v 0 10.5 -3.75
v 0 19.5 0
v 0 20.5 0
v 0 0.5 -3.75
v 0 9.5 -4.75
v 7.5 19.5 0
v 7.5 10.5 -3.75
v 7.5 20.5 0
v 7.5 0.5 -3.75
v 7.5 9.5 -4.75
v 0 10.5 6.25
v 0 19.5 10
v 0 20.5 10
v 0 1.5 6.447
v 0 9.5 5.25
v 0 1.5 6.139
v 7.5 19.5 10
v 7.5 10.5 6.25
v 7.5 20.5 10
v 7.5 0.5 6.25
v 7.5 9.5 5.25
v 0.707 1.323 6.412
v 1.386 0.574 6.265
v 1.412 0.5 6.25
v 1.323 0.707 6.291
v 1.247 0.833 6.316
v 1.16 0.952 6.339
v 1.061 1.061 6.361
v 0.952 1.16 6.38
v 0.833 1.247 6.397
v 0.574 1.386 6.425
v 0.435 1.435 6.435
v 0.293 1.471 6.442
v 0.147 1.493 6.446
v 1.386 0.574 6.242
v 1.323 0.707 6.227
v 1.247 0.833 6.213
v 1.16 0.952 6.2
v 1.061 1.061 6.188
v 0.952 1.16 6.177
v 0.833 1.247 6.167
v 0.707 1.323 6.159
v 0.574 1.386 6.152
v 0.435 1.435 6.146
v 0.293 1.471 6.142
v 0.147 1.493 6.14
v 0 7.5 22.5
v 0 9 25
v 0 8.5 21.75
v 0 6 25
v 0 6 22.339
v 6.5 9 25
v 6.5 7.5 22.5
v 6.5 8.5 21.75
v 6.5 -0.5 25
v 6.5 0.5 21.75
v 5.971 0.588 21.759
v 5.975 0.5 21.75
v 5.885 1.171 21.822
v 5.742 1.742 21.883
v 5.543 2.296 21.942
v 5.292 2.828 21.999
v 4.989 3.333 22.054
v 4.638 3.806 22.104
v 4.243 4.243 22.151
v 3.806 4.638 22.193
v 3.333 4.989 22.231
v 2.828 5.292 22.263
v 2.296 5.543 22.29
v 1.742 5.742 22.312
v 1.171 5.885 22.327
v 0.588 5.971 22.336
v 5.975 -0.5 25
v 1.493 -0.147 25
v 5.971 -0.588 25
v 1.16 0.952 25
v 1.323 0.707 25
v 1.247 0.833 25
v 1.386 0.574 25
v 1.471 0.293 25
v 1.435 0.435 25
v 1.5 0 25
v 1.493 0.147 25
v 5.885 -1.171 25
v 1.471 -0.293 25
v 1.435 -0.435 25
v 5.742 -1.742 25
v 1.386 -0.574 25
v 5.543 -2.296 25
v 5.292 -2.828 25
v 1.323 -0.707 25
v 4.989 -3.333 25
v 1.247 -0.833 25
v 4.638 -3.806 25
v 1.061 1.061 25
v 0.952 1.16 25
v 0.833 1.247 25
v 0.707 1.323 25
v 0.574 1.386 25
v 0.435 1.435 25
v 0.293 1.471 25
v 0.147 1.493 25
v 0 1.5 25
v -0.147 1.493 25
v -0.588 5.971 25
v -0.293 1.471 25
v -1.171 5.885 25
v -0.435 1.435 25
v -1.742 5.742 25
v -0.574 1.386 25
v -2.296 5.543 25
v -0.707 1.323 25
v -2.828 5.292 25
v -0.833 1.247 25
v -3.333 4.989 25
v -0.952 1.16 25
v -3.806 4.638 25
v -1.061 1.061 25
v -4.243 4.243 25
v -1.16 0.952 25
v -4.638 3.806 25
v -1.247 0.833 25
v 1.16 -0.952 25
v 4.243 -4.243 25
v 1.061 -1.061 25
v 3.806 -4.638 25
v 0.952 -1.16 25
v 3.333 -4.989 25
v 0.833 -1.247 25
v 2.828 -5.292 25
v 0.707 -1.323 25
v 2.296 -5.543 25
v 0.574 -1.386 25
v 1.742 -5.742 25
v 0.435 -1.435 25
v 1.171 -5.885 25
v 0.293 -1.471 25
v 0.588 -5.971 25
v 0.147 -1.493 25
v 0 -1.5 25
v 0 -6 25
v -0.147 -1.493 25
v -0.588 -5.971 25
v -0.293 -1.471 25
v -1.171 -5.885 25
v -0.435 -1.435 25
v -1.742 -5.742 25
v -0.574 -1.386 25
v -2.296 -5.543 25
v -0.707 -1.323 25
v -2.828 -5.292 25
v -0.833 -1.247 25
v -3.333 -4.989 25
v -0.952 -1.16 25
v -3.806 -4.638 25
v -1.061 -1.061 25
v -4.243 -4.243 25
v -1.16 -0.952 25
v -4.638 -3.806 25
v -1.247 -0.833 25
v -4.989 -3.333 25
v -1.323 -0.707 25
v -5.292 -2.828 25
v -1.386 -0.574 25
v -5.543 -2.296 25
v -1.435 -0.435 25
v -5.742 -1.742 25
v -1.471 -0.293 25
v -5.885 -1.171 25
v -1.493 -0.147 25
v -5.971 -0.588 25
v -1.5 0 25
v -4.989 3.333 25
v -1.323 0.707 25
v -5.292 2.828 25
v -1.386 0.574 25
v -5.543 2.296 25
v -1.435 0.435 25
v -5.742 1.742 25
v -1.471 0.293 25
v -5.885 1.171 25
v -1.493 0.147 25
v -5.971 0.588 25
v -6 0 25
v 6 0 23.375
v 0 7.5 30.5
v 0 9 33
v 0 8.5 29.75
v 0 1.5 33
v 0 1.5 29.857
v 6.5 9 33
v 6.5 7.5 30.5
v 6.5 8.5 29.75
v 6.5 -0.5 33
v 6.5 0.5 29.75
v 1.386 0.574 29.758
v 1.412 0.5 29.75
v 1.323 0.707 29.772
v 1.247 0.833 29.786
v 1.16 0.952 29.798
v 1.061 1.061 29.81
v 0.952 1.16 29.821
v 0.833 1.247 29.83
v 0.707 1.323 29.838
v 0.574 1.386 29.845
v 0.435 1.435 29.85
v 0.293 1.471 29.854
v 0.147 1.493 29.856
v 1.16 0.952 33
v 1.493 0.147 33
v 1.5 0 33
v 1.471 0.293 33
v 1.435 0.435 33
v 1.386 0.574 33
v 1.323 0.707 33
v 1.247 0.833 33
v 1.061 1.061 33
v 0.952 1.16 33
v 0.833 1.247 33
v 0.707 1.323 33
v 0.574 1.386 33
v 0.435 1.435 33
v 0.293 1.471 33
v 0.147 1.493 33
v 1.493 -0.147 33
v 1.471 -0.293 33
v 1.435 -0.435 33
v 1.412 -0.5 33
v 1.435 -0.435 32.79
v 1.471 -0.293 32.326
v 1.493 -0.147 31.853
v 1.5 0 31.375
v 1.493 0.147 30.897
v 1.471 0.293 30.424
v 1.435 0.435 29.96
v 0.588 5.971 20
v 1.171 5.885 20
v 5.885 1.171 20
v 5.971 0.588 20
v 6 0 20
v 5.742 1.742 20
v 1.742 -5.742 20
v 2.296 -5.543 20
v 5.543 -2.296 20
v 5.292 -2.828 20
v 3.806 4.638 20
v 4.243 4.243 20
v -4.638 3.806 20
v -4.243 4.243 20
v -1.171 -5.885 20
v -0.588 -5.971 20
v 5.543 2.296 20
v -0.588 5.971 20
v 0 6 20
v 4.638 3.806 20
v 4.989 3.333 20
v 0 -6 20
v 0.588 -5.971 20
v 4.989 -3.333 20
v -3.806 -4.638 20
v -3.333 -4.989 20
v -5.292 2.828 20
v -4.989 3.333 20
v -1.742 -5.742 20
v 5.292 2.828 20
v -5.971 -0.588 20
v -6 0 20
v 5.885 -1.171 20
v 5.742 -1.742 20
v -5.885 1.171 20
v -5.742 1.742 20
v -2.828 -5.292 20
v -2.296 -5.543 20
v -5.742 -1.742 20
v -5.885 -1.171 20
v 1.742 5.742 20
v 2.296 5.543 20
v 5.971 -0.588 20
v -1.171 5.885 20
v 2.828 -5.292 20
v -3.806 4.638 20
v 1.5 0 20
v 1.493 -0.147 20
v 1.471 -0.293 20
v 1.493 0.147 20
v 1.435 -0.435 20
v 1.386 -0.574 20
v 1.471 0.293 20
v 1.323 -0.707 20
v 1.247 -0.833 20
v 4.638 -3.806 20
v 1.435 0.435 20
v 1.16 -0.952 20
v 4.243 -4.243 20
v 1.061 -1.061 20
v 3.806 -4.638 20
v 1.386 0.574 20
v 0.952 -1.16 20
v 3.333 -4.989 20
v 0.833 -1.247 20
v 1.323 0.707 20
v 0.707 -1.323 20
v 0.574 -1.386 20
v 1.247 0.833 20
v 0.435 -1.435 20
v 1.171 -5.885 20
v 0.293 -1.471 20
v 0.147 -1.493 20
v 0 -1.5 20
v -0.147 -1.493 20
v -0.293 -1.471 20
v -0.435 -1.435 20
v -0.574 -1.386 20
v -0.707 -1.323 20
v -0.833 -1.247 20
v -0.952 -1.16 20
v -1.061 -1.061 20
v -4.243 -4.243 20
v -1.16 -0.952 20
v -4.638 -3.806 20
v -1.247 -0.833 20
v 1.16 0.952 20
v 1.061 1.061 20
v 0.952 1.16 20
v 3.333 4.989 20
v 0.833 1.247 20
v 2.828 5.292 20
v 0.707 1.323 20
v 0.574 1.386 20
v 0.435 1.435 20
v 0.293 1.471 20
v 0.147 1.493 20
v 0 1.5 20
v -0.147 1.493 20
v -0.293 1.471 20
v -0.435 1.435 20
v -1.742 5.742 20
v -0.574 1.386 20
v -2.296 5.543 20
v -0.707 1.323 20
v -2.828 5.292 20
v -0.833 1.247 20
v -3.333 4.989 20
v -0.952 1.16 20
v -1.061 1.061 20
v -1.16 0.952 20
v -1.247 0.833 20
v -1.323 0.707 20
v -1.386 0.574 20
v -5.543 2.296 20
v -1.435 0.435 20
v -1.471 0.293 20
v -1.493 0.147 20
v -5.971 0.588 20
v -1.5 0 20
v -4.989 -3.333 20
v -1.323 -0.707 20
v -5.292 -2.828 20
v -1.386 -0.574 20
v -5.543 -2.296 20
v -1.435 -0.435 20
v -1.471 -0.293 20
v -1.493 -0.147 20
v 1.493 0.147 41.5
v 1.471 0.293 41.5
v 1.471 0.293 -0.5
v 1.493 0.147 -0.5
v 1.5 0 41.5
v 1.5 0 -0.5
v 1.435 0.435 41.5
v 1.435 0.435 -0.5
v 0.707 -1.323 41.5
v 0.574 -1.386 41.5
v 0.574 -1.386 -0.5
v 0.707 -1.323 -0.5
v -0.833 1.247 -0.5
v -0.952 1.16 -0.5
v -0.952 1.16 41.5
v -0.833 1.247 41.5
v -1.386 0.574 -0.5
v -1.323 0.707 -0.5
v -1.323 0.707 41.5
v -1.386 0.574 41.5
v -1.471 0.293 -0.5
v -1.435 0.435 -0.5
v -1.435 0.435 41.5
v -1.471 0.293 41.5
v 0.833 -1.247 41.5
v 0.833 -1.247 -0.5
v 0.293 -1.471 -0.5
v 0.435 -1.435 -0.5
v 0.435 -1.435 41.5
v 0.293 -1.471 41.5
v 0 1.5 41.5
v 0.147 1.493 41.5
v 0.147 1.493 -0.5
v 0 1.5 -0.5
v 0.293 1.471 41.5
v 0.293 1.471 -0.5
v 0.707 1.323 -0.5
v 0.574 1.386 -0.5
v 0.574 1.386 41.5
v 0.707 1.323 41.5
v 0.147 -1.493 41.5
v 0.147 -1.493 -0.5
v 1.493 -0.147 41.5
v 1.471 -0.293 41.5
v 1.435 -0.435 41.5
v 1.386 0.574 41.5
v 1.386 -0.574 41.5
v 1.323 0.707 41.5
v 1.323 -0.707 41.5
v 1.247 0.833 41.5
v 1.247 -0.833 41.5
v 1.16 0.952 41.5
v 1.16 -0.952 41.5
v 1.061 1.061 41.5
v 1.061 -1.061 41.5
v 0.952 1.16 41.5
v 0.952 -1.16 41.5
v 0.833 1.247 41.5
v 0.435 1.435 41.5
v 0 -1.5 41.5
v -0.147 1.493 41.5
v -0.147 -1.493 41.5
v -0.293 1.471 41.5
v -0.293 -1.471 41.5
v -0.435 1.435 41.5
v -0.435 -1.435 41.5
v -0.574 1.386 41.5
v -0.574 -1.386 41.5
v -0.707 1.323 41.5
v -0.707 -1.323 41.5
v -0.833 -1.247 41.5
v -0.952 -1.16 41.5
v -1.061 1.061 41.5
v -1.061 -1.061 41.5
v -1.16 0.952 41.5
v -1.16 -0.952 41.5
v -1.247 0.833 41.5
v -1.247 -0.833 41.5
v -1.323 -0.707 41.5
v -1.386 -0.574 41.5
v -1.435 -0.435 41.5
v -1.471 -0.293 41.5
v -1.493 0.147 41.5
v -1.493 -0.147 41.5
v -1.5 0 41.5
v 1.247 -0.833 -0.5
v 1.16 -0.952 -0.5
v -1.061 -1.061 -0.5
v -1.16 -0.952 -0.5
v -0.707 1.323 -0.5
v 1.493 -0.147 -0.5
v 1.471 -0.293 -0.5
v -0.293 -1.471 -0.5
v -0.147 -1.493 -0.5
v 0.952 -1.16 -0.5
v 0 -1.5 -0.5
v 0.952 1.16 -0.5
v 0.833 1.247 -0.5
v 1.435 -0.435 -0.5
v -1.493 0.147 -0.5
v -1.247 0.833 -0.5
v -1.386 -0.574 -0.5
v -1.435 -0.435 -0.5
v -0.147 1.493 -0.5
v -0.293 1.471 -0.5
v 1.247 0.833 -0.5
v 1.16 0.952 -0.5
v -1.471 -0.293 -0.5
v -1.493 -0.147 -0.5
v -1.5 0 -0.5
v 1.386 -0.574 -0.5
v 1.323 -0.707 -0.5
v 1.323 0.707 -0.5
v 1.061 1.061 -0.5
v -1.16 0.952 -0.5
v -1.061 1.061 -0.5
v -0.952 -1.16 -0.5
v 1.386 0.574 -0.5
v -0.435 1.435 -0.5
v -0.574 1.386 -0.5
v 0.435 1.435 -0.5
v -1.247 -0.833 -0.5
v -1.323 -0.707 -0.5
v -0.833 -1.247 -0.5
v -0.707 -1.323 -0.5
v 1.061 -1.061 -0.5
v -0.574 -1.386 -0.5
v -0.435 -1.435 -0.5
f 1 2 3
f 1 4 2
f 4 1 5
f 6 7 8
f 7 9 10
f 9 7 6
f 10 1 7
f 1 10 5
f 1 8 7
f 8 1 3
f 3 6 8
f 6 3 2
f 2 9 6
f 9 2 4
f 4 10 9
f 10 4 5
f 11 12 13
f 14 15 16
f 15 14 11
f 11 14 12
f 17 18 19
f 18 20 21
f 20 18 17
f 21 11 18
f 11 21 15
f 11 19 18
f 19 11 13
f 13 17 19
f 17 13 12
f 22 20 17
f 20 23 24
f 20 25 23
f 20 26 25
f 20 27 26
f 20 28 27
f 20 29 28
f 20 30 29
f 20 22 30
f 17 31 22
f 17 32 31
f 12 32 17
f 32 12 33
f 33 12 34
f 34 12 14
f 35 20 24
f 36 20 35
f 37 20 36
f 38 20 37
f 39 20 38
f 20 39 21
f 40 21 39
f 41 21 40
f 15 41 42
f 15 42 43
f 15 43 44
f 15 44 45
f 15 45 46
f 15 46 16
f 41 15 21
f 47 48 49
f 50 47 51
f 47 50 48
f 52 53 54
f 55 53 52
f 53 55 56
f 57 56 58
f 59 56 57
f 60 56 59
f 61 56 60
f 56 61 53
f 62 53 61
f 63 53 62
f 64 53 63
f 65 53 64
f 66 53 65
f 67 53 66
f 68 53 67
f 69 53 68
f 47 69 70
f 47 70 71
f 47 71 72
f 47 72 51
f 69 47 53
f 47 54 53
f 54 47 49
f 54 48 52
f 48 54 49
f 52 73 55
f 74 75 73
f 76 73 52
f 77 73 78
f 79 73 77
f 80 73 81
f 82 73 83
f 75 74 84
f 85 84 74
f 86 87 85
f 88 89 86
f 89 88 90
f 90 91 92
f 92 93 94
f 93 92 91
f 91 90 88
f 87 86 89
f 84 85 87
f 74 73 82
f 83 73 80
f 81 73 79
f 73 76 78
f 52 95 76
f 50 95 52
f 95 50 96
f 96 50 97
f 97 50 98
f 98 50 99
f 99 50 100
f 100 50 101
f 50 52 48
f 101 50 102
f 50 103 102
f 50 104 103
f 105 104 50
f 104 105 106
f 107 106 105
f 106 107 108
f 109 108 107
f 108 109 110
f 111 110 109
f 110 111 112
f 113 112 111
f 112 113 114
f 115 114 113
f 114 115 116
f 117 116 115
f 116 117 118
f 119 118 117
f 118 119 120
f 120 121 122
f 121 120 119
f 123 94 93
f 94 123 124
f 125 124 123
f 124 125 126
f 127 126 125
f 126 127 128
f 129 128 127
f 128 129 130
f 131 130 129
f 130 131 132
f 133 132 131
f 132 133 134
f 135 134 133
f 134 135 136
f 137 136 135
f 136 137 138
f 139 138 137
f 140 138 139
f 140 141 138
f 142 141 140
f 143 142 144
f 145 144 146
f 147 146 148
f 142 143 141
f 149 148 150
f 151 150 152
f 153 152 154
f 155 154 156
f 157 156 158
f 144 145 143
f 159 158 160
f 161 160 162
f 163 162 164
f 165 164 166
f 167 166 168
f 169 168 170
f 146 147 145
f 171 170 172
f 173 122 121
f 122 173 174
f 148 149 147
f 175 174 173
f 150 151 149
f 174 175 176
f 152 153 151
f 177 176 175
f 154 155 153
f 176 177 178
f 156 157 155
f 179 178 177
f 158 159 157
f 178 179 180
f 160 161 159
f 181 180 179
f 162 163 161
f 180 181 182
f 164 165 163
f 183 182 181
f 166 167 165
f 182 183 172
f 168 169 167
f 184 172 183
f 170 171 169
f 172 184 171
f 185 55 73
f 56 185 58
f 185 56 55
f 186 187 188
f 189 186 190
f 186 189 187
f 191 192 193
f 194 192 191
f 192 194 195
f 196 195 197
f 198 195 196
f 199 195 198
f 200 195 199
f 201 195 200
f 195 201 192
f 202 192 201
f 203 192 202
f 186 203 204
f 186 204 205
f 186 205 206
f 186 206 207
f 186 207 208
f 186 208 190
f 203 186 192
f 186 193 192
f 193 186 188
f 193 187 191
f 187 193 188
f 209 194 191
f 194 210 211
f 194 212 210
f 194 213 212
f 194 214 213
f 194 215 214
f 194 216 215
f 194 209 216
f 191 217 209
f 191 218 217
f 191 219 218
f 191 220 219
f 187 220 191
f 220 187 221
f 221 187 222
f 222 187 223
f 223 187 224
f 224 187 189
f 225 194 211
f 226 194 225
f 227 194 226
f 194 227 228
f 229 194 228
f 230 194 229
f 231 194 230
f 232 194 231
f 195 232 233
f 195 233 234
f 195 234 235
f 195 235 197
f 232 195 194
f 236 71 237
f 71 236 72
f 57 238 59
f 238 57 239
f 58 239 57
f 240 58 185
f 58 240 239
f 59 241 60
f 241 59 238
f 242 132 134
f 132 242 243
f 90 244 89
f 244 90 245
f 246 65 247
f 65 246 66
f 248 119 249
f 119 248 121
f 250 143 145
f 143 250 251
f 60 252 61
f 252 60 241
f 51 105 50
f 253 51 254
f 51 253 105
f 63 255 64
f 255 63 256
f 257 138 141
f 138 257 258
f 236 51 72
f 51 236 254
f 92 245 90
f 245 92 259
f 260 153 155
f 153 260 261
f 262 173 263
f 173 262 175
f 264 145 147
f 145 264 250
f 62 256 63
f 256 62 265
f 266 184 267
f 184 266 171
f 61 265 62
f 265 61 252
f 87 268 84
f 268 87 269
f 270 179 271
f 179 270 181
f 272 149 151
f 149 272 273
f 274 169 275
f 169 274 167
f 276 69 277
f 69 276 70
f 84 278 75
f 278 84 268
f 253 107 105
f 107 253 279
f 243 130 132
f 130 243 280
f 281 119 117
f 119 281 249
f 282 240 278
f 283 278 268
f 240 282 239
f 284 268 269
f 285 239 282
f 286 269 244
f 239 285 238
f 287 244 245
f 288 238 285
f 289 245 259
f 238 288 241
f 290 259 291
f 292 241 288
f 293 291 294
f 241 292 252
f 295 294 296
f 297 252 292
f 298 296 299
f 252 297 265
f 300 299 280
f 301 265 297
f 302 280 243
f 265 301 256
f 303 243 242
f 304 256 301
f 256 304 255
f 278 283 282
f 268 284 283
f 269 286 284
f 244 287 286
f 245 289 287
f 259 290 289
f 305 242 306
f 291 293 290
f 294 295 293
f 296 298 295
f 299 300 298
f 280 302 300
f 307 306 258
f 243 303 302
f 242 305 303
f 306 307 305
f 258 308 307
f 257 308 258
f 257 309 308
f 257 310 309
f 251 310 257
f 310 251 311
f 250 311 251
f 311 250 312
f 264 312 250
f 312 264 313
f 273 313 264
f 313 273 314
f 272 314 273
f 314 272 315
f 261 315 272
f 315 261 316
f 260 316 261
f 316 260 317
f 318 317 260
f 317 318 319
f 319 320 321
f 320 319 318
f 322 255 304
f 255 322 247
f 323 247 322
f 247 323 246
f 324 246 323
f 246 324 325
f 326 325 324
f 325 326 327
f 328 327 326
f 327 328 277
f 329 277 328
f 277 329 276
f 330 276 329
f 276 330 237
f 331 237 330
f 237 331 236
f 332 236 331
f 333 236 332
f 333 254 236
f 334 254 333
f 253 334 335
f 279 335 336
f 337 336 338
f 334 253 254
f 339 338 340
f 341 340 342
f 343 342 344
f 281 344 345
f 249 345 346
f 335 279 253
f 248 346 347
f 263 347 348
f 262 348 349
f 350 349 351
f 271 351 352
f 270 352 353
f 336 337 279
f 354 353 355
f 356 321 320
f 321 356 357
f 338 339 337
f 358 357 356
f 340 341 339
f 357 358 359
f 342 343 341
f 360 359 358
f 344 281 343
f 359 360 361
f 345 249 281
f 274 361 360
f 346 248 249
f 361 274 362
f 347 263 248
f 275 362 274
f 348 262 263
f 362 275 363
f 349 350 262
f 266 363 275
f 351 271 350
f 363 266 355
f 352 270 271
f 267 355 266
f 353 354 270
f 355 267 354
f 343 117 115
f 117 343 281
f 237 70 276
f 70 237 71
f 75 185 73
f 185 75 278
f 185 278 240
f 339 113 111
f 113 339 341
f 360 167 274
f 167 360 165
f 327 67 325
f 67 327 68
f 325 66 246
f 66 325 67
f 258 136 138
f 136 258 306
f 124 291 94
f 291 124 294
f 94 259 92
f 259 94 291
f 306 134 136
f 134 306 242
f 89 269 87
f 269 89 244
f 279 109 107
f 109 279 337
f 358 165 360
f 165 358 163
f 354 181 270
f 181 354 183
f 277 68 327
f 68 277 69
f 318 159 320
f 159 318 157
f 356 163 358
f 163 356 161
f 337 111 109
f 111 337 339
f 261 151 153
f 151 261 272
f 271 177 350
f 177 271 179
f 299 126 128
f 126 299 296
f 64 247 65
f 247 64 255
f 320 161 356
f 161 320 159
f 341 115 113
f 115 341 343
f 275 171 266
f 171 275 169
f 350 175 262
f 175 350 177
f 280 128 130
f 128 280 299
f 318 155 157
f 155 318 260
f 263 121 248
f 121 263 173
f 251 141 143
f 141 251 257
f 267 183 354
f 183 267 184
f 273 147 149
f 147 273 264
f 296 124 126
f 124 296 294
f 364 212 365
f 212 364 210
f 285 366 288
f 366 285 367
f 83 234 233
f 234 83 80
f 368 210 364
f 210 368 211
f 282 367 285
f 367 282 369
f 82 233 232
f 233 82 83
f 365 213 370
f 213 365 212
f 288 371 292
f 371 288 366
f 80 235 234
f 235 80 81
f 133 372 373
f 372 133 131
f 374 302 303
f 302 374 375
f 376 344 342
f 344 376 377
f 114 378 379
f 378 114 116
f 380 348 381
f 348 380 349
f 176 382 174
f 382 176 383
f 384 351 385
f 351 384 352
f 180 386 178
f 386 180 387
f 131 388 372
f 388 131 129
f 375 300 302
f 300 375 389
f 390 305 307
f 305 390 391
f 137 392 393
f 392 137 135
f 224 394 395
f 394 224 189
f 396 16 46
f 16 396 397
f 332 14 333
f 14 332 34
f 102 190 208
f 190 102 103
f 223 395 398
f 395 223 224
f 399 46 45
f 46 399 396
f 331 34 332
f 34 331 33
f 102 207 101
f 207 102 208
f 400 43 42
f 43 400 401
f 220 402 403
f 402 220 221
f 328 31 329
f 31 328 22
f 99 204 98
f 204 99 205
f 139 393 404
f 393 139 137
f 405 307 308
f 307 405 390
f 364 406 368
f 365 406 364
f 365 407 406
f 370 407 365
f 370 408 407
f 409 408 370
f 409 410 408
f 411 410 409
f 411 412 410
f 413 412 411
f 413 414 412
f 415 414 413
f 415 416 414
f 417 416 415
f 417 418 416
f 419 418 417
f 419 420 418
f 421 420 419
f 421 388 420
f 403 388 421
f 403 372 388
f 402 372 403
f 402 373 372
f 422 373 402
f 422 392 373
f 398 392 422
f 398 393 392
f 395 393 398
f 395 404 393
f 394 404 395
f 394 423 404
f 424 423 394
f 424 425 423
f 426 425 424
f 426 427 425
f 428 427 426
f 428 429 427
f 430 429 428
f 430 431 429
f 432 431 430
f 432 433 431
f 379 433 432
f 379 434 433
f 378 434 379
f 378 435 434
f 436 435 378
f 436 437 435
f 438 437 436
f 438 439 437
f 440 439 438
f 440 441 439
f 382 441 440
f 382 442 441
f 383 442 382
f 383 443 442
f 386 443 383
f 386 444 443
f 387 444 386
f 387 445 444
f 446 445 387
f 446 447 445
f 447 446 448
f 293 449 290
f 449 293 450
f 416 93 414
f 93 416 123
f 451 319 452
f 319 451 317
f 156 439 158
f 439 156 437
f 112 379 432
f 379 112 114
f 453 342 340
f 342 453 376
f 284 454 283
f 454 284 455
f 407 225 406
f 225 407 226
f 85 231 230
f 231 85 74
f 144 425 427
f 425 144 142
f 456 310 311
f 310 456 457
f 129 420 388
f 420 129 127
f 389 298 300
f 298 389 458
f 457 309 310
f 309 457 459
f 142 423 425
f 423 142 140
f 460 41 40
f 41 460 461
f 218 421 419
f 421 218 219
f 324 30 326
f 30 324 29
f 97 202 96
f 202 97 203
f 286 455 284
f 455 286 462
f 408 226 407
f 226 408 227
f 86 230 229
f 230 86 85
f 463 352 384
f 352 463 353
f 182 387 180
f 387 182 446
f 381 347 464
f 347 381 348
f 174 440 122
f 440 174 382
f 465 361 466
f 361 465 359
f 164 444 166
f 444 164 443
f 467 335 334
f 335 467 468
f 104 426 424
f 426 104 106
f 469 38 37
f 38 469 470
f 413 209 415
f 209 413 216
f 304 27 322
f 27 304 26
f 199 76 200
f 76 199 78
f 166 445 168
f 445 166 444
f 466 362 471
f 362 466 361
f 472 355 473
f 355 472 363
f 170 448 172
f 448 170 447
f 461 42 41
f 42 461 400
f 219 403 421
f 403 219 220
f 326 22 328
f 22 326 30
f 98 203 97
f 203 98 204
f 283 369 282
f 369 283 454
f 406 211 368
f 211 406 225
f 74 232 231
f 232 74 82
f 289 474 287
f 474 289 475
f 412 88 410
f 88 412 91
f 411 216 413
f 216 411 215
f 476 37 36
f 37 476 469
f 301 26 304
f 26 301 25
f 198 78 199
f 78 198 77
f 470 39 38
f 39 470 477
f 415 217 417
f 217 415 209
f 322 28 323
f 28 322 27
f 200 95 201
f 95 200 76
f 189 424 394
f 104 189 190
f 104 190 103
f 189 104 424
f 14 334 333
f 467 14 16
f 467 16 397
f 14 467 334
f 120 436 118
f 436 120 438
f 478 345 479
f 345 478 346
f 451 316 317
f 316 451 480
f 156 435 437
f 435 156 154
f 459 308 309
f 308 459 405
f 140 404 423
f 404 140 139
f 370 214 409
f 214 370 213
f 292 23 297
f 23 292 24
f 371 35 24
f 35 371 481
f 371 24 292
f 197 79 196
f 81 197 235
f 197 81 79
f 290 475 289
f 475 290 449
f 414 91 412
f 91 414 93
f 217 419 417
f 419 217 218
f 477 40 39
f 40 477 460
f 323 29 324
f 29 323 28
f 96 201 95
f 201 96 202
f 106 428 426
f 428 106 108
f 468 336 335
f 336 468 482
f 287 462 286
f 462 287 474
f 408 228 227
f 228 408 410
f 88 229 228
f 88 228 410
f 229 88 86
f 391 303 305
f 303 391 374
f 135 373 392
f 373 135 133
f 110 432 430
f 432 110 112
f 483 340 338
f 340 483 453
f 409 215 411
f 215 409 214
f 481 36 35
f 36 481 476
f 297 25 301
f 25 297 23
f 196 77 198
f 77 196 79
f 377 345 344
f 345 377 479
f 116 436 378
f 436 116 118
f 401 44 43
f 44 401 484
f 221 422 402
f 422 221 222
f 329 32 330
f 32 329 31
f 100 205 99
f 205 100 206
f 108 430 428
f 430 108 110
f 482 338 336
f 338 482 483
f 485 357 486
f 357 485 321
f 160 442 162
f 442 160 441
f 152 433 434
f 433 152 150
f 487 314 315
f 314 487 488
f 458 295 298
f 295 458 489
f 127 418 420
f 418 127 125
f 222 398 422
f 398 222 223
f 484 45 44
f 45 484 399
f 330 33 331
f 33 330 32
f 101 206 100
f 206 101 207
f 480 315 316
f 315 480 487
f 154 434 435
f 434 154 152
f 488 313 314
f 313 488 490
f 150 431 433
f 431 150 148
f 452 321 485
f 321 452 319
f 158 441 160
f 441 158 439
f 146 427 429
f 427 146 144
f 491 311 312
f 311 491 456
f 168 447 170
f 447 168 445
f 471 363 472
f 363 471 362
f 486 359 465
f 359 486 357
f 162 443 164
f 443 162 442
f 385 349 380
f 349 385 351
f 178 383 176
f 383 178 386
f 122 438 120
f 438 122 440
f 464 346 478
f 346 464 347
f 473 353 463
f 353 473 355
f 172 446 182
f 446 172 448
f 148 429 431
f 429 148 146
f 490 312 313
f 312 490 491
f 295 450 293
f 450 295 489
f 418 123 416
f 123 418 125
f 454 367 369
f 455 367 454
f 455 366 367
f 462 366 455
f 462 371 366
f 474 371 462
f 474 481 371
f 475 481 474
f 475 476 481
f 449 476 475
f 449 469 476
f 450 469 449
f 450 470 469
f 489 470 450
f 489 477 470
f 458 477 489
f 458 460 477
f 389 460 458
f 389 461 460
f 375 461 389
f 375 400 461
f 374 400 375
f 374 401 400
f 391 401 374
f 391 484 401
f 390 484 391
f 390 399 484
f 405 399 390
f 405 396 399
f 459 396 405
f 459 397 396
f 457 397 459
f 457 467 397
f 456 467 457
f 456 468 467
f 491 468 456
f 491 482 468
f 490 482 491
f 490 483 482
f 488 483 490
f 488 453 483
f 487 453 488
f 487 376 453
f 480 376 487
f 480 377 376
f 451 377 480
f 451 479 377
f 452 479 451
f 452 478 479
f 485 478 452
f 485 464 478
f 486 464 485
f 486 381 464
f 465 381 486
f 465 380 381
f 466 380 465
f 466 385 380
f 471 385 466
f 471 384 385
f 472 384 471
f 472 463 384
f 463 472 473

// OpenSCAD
// Hose-barb reducer: 8 mm tubing -> 5 mm tubing
// Print orientation: standing upright along +Z

$fn = 64;

// ---- 8 mm tubing barbs (z = 0 .. 20) ----
barb_h      = 10;   // barb height
barb_od_bot = 7.5;  // outer diameter at bottom of barb
barb_od_top = 9.5;  // outer diameter at top of barb
barb_count  = 2;    // stacked barbs

// ---- collar (z = 20 .. 25) ----
collar_d    = 12;   // collar diameter
collar_h    = 5;    // collar height

// ---- 5 mm tubing barbs (z = 25 .. 41) ----
barb2_h     = 8;    // barb height
barb2_od_bot = 6.5; // outer diameter at bottom of barb
barb2_od_top = 5.0; // outer diameter at top of barb
barb2_count = 2;    // stacked barbs

// ---- bore ----
bore_d      = 3;    // through-bore diameter

// ---- cut overlap ----
eps         = 0.5;  // extension past cut faces

module barb_profile() {
    // sawtooth: from bottom to top: 7.5 -> 9.5 -> 7.5
    polygon(points = [
        [0, barb_h * 2 - eps],
        [barb_od_bot / 2, eps],
        [barb_od_top / 2, barb_h - eps],
        [barb_od_bot / 2, barb_h + eps],
        [0, barb_h * 2 + eps]
    ]);
}

union() {
    // 8 mm barbs
    for (i = [0 : barb_count - 1])
        translate([0, 0, i * barb_h])
            rotate([0, 90, 0])
                linear_extrude(height = barb_od_bot)
                    barb_profile();

    // collar
    translate([0, 0, barb_count * barb_h])
        cylinder(d = collar_d, h = collar_h);

    // 5 mm barbs
    for (i = [0 : barb2_count - 1])
        translate([0, 0, barb_count * barb_h + collar_h + i * barb2_h])
            rotate([0, 90, 0])
                linear_extrude(height = barb2_od_bot)
                    polygon(points = [
                        [0, -eps],
                        [barb2_od_bot / 2, eps],
                        [barb2_od_top / 2, barb2_h - eps],
                        [barb2_od_bot / 2, barb2_h + eps],
                        [0, barb2_h + 2 * eps]
                    ]);

    // bore
    translate([0, 0, -eps])
        cylinder(d = bore_d, h = barb_count * barb_h + collar_h + barb2_count * barb2_h + 2 * eps);
}
